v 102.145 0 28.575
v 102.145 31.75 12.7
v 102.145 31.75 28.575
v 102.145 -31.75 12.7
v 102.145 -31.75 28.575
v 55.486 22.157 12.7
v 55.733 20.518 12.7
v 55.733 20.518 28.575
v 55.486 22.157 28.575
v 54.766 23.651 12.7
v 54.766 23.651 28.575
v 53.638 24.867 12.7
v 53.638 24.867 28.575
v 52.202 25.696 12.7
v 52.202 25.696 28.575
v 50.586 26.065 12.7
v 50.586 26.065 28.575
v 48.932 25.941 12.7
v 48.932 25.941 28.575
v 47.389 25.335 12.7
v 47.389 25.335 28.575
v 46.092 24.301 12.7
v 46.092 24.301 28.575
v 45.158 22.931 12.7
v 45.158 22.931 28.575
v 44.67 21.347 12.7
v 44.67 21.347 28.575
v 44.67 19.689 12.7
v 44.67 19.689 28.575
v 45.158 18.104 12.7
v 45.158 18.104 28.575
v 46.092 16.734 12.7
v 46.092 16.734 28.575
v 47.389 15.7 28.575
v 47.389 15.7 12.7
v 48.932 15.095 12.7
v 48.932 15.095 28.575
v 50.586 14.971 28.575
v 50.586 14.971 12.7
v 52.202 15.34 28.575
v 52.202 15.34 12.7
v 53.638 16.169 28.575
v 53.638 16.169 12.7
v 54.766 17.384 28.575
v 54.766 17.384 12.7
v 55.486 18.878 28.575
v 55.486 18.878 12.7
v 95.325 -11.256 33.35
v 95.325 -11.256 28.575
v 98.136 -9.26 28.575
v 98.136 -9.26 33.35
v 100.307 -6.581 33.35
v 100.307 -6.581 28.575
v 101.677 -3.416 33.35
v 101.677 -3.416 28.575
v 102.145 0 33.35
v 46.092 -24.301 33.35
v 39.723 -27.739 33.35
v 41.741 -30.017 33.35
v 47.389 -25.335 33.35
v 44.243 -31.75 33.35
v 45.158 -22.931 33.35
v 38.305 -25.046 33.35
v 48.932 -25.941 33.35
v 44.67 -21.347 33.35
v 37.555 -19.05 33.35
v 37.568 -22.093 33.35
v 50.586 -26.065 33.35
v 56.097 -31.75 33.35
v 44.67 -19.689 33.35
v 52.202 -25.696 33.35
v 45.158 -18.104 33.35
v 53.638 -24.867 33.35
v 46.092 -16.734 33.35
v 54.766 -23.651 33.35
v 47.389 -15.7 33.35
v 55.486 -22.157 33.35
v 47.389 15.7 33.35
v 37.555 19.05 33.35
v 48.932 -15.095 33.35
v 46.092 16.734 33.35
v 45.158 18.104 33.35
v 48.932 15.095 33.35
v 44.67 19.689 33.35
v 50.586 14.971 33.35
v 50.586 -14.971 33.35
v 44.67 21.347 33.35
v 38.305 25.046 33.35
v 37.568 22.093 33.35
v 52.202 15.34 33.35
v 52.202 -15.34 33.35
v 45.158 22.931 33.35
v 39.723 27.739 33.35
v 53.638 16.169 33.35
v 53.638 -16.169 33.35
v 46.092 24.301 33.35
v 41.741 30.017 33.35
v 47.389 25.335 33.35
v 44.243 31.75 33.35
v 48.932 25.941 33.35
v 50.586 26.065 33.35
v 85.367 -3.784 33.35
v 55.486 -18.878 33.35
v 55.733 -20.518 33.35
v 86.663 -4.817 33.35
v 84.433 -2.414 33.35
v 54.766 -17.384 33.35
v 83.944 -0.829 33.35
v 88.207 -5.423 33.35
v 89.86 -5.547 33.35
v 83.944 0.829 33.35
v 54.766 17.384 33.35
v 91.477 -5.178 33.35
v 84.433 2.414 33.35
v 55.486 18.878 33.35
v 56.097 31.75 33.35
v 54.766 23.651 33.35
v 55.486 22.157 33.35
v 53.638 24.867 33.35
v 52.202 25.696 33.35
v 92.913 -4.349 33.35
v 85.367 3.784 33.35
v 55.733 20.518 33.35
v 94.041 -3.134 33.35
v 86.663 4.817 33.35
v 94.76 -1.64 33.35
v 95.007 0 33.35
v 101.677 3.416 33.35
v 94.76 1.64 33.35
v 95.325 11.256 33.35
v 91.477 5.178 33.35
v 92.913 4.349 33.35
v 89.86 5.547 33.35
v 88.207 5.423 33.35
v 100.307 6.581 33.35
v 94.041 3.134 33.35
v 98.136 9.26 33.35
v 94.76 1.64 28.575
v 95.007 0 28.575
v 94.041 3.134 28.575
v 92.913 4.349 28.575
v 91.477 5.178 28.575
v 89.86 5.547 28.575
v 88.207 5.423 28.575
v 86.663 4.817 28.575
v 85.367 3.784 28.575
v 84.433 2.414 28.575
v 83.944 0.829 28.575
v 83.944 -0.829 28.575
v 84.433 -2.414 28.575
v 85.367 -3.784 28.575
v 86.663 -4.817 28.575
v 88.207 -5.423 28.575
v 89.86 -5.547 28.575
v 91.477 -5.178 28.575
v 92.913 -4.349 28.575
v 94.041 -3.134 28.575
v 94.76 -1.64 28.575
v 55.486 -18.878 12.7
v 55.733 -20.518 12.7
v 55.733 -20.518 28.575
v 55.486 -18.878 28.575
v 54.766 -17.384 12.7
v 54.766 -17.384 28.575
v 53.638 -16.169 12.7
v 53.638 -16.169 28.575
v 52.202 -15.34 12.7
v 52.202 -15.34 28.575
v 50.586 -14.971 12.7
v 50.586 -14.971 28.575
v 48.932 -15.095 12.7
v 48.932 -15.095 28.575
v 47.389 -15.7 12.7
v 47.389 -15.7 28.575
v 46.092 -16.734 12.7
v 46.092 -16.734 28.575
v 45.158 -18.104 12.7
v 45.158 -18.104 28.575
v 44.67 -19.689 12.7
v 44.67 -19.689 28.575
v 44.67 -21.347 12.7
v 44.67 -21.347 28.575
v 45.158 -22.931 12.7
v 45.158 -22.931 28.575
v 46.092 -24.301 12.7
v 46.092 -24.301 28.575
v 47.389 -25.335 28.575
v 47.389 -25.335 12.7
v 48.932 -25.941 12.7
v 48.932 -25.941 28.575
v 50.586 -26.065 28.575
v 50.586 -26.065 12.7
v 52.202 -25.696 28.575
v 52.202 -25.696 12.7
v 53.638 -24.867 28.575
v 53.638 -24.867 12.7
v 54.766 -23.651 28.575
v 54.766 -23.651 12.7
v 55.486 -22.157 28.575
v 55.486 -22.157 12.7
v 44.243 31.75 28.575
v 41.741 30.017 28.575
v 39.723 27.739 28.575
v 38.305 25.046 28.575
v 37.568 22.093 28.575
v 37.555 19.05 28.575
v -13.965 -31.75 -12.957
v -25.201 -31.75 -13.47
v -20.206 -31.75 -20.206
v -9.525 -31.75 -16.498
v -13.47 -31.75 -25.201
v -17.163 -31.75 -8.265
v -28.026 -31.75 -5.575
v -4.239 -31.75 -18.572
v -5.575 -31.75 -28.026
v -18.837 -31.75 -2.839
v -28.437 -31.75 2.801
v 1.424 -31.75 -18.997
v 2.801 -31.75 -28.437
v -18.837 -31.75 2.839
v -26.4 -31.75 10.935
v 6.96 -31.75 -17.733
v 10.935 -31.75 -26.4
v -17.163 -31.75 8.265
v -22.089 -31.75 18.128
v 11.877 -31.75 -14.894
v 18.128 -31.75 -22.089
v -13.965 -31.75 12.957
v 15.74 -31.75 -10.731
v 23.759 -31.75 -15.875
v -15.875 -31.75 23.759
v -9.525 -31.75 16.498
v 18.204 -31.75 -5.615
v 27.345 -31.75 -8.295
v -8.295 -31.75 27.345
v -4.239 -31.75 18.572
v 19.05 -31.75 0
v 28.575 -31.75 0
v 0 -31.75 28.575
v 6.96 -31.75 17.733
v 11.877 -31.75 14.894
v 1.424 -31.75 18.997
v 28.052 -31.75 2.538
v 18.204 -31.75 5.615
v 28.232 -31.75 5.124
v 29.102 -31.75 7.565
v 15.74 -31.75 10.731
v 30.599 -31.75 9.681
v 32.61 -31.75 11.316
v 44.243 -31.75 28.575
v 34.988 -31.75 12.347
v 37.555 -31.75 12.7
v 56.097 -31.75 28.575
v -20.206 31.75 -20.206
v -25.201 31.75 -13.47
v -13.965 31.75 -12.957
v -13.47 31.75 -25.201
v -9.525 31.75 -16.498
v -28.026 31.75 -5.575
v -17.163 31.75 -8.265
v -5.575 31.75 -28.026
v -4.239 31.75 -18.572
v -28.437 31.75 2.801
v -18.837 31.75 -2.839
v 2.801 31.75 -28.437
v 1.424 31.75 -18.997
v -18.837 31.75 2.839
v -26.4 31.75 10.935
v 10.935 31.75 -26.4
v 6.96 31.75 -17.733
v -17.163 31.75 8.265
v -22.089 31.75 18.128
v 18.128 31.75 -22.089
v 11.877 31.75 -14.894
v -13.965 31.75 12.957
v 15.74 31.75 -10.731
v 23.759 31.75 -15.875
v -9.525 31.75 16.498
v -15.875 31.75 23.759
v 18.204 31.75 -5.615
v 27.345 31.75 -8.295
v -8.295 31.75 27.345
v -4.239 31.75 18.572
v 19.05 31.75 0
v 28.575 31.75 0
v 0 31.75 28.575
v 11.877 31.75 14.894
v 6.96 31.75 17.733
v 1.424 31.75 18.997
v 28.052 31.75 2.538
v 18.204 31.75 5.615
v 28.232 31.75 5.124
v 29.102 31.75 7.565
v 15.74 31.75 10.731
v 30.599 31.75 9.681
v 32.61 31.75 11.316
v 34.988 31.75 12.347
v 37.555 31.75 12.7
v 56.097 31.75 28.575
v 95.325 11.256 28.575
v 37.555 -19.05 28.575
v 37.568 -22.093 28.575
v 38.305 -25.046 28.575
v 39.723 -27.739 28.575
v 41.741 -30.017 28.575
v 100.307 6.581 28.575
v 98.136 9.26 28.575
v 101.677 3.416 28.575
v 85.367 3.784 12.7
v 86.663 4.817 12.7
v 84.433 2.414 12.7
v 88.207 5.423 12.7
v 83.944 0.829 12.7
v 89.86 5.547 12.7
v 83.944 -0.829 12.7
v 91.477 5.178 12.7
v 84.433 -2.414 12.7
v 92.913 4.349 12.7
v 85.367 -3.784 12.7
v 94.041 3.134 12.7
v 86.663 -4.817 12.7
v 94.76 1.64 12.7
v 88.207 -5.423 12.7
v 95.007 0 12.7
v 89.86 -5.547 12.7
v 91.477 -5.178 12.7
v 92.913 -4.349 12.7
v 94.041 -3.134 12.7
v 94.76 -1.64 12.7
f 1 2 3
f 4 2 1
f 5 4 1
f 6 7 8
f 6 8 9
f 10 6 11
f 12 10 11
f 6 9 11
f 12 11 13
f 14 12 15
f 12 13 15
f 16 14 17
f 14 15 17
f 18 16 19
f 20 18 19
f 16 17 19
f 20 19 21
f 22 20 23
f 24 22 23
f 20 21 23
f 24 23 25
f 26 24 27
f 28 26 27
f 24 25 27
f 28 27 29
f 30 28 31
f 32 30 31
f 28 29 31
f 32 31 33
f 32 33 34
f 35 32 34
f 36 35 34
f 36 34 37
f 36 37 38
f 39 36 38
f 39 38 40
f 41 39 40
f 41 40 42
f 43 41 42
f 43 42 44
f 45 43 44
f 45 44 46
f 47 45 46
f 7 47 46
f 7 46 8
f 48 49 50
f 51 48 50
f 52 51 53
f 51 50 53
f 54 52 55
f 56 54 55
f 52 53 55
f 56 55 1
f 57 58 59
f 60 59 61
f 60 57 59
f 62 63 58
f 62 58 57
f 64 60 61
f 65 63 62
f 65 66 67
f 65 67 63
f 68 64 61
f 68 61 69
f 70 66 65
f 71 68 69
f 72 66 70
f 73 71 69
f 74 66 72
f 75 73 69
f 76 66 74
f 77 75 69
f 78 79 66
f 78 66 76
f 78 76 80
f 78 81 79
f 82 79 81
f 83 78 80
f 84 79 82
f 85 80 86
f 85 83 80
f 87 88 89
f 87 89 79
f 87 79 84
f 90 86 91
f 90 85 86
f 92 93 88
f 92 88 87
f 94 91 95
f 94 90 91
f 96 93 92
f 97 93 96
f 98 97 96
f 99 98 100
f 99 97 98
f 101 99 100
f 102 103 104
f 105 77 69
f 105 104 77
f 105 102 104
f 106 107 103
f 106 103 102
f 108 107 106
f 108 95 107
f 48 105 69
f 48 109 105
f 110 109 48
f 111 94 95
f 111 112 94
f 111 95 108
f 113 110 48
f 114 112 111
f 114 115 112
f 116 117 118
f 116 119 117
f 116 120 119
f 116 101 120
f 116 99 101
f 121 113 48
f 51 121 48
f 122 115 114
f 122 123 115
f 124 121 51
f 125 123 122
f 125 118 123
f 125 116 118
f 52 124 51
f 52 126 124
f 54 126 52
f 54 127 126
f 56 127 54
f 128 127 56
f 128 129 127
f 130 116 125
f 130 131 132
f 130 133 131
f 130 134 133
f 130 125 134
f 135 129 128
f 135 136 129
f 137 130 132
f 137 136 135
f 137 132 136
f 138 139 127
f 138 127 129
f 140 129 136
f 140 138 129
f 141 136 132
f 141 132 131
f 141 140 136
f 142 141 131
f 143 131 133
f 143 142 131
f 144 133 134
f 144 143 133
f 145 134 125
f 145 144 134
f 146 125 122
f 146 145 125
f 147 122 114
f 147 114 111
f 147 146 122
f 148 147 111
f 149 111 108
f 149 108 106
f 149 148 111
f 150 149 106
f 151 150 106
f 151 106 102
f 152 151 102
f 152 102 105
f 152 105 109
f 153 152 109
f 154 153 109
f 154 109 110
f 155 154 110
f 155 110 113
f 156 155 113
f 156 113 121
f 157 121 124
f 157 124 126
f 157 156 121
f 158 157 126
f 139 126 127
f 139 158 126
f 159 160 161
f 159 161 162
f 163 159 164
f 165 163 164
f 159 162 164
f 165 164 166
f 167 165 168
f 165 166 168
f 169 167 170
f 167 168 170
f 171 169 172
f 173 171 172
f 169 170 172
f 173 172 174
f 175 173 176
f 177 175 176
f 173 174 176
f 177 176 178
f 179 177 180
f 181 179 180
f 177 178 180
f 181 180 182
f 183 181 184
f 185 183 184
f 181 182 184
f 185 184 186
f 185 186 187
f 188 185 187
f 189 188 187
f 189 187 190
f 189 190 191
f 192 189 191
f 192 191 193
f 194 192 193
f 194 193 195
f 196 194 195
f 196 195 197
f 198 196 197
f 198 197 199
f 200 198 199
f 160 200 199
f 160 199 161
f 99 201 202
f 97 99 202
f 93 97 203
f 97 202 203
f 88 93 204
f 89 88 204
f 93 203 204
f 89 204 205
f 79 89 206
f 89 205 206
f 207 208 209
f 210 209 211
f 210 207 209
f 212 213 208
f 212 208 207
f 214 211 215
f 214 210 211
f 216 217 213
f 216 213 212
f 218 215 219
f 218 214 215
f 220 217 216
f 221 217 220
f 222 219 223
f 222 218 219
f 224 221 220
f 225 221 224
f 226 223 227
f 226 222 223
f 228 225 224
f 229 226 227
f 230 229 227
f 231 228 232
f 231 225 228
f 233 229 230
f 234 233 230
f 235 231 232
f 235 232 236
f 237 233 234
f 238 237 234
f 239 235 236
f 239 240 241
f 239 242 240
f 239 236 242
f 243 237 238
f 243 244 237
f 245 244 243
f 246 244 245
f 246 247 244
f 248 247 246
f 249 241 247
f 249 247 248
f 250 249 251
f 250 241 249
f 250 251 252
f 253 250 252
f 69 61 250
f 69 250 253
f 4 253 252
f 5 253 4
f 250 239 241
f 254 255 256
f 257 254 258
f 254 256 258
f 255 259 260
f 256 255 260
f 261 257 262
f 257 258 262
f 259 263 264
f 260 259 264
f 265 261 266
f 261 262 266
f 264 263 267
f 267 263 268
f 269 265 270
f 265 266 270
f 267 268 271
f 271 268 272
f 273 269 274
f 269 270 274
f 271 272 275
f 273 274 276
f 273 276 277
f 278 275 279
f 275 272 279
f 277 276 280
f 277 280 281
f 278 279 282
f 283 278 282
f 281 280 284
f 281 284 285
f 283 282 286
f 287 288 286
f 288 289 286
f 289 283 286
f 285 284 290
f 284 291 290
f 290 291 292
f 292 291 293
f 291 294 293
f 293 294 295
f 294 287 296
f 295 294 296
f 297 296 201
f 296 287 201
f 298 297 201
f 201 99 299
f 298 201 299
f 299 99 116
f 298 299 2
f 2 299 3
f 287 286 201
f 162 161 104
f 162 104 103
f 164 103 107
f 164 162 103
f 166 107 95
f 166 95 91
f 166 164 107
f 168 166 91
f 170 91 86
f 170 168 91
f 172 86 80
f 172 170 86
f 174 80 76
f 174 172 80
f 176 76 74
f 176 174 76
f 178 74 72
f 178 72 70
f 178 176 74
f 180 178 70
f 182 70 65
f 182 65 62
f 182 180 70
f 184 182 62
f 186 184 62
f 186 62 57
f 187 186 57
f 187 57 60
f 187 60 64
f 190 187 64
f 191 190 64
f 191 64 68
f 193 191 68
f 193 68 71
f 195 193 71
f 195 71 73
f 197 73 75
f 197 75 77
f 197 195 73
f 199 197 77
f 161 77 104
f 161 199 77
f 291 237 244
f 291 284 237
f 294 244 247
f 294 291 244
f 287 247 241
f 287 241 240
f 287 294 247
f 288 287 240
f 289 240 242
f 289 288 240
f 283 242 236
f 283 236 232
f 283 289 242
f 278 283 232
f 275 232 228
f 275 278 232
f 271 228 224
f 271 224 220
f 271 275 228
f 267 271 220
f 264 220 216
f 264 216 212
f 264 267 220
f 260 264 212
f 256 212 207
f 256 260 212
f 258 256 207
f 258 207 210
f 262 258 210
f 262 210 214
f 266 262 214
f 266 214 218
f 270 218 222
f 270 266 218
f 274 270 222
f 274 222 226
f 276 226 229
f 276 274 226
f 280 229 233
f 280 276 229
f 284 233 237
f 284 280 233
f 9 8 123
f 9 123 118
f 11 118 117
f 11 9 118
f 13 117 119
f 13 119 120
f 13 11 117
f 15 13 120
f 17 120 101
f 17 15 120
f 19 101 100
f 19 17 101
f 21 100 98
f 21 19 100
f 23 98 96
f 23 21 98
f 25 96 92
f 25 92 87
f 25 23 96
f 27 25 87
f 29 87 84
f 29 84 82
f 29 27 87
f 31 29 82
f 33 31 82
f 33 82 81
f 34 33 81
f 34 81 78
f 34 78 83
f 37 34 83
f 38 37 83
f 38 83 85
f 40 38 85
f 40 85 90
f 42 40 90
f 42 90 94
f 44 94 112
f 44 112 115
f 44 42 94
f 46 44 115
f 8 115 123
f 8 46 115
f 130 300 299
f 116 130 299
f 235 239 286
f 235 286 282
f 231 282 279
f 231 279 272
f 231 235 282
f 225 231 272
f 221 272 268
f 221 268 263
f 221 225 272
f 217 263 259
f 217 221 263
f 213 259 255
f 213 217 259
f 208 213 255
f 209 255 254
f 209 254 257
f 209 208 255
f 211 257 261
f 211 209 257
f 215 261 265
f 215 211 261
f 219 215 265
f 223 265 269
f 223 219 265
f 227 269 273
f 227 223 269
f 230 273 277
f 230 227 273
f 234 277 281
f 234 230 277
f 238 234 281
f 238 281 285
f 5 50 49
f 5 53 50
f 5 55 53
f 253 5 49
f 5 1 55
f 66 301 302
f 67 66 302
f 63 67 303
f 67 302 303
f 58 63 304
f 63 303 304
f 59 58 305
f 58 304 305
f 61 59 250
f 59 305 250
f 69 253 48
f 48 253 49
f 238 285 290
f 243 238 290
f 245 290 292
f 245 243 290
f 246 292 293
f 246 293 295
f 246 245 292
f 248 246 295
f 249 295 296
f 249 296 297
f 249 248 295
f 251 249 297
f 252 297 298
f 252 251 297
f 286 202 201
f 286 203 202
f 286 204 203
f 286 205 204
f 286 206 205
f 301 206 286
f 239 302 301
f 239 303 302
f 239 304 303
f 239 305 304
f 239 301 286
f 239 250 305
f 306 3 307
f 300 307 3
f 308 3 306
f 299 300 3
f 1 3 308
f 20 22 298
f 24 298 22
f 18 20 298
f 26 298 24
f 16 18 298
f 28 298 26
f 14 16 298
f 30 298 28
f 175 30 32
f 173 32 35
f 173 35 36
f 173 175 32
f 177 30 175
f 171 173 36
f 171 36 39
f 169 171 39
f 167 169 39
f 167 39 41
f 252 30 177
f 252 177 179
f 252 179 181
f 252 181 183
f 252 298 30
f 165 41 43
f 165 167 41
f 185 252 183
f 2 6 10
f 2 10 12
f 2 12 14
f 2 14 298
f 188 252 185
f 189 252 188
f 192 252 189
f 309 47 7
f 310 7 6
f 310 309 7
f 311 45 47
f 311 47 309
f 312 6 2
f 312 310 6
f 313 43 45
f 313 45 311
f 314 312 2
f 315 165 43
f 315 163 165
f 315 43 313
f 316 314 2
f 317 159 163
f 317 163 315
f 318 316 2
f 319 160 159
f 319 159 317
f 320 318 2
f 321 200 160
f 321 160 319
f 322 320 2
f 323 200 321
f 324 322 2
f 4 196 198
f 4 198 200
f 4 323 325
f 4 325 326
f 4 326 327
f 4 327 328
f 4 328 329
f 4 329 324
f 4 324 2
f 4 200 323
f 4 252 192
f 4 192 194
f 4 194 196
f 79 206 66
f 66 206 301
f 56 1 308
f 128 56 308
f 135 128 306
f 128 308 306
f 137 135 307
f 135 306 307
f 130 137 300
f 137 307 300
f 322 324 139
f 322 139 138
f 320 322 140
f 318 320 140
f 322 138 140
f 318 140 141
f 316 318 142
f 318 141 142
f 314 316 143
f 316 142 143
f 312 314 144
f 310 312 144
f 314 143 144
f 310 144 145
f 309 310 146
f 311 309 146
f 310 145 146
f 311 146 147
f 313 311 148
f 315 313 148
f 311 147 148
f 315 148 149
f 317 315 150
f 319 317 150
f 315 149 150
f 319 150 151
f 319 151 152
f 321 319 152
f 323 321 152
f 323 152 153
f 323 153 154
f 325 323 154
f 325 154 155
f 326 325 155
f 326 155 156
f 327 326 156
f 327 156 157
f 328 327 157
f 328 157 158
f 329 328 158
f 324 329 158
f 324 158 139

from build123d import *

# Parameters (mm, degrees)
F0_R     = 19.05
F1_DEPTH = 31.75
F3_R     = 5.5626
F4_DEPTH = 4.7752
F5_DEPTH = 57.151


with BuildPart() as f1:
    # F0 (on Front) → F1 (new body, symmetric)
    with BuildSketch(Plane.XZ):
        with BuildLine():
            Line((102.1447438789, 28.575), (0, 28.575))
            ThreePointArc((0, 28.575), (-20.2055762724, -20.2055762724), (28.575, 0))
            ThreePointArc((28.575, 0), (29.7781261877, 8.674261314), (37.5552561211, 12.7))
            Line((37.5552561211, 12.7), (102.1447438789, 12.7))
            Line((102.1447438789, 12.7), (102.1447438789, 28.575))
        make_face()
        Circle(F0_R, mode=Mode.SUBTRACT)
    extrude(amount=F1_DEPTH, both=True)

    # F3 (on face) → F4 (join)
    with BuildSketch(Plane.XY.offset(28.575)):
        with BuildLine():
            ThreePointArc((44.2432574162, 31.75), (38.9330700337, 26.4354220023), (37.5552561211, 19.05))
            Line((37.5552561211, 19.05), (37.5552561211, -19.05))
            ThreePointArc((37.5552561211, -19.05), (38.9330700337, -26.4354220023), (44.2432574161, -31.75))
            Line((44.2432574161, -31.75), (56.097272461, -31.75))
            Line((56.097272461, -31.75), (95.3253515684, -11.2564849399))
            ThreePointArc((95.3253515684, -11.2564849399), (100.3069194614, -6.5805122609), (102.1447438789, -7.87e-08))
            ThreePointArc((102.1447438789, -7.87e-08), (100.3069195022, 6.5805121935), (95.3253515684, 11.2564849399))
            Line((95.3253515684, 11.2564849399), (56.097272461, 31.75))
            Line((56.097272461, 31.75), (44.2432574162, 31.75))
        make_face()
        with Locations((50.170148764, -20.5178159314)):
            Circle(F3_R, mode=Mode.SUBTRACT)
        with Locations((50.170148764, 20.5178159314)):
            Circle(F3_R, mode=Mode.SUBTRACT)
        with Locations((89.4447438789, 0)):
            Circle(F3_R, mode=Mode.SUBTRACT)
    extrude(amount=F4_DEPTH)

    # F5 (cut, through all): faces of the model
    f5_faces = [f1.faces().sort_by_distance(p)[0] for p in [
        (89.4447438789, 0, 28.575),
        (50.170148764, -20.5178159314, 28.575),
        (50.170148764, 20.5178159314, 28.575),
    ]]
    extrude(f5_faces, amount=-F5_DEPTH, mode=Mode.SUBTRACT)


solid = f1.part
